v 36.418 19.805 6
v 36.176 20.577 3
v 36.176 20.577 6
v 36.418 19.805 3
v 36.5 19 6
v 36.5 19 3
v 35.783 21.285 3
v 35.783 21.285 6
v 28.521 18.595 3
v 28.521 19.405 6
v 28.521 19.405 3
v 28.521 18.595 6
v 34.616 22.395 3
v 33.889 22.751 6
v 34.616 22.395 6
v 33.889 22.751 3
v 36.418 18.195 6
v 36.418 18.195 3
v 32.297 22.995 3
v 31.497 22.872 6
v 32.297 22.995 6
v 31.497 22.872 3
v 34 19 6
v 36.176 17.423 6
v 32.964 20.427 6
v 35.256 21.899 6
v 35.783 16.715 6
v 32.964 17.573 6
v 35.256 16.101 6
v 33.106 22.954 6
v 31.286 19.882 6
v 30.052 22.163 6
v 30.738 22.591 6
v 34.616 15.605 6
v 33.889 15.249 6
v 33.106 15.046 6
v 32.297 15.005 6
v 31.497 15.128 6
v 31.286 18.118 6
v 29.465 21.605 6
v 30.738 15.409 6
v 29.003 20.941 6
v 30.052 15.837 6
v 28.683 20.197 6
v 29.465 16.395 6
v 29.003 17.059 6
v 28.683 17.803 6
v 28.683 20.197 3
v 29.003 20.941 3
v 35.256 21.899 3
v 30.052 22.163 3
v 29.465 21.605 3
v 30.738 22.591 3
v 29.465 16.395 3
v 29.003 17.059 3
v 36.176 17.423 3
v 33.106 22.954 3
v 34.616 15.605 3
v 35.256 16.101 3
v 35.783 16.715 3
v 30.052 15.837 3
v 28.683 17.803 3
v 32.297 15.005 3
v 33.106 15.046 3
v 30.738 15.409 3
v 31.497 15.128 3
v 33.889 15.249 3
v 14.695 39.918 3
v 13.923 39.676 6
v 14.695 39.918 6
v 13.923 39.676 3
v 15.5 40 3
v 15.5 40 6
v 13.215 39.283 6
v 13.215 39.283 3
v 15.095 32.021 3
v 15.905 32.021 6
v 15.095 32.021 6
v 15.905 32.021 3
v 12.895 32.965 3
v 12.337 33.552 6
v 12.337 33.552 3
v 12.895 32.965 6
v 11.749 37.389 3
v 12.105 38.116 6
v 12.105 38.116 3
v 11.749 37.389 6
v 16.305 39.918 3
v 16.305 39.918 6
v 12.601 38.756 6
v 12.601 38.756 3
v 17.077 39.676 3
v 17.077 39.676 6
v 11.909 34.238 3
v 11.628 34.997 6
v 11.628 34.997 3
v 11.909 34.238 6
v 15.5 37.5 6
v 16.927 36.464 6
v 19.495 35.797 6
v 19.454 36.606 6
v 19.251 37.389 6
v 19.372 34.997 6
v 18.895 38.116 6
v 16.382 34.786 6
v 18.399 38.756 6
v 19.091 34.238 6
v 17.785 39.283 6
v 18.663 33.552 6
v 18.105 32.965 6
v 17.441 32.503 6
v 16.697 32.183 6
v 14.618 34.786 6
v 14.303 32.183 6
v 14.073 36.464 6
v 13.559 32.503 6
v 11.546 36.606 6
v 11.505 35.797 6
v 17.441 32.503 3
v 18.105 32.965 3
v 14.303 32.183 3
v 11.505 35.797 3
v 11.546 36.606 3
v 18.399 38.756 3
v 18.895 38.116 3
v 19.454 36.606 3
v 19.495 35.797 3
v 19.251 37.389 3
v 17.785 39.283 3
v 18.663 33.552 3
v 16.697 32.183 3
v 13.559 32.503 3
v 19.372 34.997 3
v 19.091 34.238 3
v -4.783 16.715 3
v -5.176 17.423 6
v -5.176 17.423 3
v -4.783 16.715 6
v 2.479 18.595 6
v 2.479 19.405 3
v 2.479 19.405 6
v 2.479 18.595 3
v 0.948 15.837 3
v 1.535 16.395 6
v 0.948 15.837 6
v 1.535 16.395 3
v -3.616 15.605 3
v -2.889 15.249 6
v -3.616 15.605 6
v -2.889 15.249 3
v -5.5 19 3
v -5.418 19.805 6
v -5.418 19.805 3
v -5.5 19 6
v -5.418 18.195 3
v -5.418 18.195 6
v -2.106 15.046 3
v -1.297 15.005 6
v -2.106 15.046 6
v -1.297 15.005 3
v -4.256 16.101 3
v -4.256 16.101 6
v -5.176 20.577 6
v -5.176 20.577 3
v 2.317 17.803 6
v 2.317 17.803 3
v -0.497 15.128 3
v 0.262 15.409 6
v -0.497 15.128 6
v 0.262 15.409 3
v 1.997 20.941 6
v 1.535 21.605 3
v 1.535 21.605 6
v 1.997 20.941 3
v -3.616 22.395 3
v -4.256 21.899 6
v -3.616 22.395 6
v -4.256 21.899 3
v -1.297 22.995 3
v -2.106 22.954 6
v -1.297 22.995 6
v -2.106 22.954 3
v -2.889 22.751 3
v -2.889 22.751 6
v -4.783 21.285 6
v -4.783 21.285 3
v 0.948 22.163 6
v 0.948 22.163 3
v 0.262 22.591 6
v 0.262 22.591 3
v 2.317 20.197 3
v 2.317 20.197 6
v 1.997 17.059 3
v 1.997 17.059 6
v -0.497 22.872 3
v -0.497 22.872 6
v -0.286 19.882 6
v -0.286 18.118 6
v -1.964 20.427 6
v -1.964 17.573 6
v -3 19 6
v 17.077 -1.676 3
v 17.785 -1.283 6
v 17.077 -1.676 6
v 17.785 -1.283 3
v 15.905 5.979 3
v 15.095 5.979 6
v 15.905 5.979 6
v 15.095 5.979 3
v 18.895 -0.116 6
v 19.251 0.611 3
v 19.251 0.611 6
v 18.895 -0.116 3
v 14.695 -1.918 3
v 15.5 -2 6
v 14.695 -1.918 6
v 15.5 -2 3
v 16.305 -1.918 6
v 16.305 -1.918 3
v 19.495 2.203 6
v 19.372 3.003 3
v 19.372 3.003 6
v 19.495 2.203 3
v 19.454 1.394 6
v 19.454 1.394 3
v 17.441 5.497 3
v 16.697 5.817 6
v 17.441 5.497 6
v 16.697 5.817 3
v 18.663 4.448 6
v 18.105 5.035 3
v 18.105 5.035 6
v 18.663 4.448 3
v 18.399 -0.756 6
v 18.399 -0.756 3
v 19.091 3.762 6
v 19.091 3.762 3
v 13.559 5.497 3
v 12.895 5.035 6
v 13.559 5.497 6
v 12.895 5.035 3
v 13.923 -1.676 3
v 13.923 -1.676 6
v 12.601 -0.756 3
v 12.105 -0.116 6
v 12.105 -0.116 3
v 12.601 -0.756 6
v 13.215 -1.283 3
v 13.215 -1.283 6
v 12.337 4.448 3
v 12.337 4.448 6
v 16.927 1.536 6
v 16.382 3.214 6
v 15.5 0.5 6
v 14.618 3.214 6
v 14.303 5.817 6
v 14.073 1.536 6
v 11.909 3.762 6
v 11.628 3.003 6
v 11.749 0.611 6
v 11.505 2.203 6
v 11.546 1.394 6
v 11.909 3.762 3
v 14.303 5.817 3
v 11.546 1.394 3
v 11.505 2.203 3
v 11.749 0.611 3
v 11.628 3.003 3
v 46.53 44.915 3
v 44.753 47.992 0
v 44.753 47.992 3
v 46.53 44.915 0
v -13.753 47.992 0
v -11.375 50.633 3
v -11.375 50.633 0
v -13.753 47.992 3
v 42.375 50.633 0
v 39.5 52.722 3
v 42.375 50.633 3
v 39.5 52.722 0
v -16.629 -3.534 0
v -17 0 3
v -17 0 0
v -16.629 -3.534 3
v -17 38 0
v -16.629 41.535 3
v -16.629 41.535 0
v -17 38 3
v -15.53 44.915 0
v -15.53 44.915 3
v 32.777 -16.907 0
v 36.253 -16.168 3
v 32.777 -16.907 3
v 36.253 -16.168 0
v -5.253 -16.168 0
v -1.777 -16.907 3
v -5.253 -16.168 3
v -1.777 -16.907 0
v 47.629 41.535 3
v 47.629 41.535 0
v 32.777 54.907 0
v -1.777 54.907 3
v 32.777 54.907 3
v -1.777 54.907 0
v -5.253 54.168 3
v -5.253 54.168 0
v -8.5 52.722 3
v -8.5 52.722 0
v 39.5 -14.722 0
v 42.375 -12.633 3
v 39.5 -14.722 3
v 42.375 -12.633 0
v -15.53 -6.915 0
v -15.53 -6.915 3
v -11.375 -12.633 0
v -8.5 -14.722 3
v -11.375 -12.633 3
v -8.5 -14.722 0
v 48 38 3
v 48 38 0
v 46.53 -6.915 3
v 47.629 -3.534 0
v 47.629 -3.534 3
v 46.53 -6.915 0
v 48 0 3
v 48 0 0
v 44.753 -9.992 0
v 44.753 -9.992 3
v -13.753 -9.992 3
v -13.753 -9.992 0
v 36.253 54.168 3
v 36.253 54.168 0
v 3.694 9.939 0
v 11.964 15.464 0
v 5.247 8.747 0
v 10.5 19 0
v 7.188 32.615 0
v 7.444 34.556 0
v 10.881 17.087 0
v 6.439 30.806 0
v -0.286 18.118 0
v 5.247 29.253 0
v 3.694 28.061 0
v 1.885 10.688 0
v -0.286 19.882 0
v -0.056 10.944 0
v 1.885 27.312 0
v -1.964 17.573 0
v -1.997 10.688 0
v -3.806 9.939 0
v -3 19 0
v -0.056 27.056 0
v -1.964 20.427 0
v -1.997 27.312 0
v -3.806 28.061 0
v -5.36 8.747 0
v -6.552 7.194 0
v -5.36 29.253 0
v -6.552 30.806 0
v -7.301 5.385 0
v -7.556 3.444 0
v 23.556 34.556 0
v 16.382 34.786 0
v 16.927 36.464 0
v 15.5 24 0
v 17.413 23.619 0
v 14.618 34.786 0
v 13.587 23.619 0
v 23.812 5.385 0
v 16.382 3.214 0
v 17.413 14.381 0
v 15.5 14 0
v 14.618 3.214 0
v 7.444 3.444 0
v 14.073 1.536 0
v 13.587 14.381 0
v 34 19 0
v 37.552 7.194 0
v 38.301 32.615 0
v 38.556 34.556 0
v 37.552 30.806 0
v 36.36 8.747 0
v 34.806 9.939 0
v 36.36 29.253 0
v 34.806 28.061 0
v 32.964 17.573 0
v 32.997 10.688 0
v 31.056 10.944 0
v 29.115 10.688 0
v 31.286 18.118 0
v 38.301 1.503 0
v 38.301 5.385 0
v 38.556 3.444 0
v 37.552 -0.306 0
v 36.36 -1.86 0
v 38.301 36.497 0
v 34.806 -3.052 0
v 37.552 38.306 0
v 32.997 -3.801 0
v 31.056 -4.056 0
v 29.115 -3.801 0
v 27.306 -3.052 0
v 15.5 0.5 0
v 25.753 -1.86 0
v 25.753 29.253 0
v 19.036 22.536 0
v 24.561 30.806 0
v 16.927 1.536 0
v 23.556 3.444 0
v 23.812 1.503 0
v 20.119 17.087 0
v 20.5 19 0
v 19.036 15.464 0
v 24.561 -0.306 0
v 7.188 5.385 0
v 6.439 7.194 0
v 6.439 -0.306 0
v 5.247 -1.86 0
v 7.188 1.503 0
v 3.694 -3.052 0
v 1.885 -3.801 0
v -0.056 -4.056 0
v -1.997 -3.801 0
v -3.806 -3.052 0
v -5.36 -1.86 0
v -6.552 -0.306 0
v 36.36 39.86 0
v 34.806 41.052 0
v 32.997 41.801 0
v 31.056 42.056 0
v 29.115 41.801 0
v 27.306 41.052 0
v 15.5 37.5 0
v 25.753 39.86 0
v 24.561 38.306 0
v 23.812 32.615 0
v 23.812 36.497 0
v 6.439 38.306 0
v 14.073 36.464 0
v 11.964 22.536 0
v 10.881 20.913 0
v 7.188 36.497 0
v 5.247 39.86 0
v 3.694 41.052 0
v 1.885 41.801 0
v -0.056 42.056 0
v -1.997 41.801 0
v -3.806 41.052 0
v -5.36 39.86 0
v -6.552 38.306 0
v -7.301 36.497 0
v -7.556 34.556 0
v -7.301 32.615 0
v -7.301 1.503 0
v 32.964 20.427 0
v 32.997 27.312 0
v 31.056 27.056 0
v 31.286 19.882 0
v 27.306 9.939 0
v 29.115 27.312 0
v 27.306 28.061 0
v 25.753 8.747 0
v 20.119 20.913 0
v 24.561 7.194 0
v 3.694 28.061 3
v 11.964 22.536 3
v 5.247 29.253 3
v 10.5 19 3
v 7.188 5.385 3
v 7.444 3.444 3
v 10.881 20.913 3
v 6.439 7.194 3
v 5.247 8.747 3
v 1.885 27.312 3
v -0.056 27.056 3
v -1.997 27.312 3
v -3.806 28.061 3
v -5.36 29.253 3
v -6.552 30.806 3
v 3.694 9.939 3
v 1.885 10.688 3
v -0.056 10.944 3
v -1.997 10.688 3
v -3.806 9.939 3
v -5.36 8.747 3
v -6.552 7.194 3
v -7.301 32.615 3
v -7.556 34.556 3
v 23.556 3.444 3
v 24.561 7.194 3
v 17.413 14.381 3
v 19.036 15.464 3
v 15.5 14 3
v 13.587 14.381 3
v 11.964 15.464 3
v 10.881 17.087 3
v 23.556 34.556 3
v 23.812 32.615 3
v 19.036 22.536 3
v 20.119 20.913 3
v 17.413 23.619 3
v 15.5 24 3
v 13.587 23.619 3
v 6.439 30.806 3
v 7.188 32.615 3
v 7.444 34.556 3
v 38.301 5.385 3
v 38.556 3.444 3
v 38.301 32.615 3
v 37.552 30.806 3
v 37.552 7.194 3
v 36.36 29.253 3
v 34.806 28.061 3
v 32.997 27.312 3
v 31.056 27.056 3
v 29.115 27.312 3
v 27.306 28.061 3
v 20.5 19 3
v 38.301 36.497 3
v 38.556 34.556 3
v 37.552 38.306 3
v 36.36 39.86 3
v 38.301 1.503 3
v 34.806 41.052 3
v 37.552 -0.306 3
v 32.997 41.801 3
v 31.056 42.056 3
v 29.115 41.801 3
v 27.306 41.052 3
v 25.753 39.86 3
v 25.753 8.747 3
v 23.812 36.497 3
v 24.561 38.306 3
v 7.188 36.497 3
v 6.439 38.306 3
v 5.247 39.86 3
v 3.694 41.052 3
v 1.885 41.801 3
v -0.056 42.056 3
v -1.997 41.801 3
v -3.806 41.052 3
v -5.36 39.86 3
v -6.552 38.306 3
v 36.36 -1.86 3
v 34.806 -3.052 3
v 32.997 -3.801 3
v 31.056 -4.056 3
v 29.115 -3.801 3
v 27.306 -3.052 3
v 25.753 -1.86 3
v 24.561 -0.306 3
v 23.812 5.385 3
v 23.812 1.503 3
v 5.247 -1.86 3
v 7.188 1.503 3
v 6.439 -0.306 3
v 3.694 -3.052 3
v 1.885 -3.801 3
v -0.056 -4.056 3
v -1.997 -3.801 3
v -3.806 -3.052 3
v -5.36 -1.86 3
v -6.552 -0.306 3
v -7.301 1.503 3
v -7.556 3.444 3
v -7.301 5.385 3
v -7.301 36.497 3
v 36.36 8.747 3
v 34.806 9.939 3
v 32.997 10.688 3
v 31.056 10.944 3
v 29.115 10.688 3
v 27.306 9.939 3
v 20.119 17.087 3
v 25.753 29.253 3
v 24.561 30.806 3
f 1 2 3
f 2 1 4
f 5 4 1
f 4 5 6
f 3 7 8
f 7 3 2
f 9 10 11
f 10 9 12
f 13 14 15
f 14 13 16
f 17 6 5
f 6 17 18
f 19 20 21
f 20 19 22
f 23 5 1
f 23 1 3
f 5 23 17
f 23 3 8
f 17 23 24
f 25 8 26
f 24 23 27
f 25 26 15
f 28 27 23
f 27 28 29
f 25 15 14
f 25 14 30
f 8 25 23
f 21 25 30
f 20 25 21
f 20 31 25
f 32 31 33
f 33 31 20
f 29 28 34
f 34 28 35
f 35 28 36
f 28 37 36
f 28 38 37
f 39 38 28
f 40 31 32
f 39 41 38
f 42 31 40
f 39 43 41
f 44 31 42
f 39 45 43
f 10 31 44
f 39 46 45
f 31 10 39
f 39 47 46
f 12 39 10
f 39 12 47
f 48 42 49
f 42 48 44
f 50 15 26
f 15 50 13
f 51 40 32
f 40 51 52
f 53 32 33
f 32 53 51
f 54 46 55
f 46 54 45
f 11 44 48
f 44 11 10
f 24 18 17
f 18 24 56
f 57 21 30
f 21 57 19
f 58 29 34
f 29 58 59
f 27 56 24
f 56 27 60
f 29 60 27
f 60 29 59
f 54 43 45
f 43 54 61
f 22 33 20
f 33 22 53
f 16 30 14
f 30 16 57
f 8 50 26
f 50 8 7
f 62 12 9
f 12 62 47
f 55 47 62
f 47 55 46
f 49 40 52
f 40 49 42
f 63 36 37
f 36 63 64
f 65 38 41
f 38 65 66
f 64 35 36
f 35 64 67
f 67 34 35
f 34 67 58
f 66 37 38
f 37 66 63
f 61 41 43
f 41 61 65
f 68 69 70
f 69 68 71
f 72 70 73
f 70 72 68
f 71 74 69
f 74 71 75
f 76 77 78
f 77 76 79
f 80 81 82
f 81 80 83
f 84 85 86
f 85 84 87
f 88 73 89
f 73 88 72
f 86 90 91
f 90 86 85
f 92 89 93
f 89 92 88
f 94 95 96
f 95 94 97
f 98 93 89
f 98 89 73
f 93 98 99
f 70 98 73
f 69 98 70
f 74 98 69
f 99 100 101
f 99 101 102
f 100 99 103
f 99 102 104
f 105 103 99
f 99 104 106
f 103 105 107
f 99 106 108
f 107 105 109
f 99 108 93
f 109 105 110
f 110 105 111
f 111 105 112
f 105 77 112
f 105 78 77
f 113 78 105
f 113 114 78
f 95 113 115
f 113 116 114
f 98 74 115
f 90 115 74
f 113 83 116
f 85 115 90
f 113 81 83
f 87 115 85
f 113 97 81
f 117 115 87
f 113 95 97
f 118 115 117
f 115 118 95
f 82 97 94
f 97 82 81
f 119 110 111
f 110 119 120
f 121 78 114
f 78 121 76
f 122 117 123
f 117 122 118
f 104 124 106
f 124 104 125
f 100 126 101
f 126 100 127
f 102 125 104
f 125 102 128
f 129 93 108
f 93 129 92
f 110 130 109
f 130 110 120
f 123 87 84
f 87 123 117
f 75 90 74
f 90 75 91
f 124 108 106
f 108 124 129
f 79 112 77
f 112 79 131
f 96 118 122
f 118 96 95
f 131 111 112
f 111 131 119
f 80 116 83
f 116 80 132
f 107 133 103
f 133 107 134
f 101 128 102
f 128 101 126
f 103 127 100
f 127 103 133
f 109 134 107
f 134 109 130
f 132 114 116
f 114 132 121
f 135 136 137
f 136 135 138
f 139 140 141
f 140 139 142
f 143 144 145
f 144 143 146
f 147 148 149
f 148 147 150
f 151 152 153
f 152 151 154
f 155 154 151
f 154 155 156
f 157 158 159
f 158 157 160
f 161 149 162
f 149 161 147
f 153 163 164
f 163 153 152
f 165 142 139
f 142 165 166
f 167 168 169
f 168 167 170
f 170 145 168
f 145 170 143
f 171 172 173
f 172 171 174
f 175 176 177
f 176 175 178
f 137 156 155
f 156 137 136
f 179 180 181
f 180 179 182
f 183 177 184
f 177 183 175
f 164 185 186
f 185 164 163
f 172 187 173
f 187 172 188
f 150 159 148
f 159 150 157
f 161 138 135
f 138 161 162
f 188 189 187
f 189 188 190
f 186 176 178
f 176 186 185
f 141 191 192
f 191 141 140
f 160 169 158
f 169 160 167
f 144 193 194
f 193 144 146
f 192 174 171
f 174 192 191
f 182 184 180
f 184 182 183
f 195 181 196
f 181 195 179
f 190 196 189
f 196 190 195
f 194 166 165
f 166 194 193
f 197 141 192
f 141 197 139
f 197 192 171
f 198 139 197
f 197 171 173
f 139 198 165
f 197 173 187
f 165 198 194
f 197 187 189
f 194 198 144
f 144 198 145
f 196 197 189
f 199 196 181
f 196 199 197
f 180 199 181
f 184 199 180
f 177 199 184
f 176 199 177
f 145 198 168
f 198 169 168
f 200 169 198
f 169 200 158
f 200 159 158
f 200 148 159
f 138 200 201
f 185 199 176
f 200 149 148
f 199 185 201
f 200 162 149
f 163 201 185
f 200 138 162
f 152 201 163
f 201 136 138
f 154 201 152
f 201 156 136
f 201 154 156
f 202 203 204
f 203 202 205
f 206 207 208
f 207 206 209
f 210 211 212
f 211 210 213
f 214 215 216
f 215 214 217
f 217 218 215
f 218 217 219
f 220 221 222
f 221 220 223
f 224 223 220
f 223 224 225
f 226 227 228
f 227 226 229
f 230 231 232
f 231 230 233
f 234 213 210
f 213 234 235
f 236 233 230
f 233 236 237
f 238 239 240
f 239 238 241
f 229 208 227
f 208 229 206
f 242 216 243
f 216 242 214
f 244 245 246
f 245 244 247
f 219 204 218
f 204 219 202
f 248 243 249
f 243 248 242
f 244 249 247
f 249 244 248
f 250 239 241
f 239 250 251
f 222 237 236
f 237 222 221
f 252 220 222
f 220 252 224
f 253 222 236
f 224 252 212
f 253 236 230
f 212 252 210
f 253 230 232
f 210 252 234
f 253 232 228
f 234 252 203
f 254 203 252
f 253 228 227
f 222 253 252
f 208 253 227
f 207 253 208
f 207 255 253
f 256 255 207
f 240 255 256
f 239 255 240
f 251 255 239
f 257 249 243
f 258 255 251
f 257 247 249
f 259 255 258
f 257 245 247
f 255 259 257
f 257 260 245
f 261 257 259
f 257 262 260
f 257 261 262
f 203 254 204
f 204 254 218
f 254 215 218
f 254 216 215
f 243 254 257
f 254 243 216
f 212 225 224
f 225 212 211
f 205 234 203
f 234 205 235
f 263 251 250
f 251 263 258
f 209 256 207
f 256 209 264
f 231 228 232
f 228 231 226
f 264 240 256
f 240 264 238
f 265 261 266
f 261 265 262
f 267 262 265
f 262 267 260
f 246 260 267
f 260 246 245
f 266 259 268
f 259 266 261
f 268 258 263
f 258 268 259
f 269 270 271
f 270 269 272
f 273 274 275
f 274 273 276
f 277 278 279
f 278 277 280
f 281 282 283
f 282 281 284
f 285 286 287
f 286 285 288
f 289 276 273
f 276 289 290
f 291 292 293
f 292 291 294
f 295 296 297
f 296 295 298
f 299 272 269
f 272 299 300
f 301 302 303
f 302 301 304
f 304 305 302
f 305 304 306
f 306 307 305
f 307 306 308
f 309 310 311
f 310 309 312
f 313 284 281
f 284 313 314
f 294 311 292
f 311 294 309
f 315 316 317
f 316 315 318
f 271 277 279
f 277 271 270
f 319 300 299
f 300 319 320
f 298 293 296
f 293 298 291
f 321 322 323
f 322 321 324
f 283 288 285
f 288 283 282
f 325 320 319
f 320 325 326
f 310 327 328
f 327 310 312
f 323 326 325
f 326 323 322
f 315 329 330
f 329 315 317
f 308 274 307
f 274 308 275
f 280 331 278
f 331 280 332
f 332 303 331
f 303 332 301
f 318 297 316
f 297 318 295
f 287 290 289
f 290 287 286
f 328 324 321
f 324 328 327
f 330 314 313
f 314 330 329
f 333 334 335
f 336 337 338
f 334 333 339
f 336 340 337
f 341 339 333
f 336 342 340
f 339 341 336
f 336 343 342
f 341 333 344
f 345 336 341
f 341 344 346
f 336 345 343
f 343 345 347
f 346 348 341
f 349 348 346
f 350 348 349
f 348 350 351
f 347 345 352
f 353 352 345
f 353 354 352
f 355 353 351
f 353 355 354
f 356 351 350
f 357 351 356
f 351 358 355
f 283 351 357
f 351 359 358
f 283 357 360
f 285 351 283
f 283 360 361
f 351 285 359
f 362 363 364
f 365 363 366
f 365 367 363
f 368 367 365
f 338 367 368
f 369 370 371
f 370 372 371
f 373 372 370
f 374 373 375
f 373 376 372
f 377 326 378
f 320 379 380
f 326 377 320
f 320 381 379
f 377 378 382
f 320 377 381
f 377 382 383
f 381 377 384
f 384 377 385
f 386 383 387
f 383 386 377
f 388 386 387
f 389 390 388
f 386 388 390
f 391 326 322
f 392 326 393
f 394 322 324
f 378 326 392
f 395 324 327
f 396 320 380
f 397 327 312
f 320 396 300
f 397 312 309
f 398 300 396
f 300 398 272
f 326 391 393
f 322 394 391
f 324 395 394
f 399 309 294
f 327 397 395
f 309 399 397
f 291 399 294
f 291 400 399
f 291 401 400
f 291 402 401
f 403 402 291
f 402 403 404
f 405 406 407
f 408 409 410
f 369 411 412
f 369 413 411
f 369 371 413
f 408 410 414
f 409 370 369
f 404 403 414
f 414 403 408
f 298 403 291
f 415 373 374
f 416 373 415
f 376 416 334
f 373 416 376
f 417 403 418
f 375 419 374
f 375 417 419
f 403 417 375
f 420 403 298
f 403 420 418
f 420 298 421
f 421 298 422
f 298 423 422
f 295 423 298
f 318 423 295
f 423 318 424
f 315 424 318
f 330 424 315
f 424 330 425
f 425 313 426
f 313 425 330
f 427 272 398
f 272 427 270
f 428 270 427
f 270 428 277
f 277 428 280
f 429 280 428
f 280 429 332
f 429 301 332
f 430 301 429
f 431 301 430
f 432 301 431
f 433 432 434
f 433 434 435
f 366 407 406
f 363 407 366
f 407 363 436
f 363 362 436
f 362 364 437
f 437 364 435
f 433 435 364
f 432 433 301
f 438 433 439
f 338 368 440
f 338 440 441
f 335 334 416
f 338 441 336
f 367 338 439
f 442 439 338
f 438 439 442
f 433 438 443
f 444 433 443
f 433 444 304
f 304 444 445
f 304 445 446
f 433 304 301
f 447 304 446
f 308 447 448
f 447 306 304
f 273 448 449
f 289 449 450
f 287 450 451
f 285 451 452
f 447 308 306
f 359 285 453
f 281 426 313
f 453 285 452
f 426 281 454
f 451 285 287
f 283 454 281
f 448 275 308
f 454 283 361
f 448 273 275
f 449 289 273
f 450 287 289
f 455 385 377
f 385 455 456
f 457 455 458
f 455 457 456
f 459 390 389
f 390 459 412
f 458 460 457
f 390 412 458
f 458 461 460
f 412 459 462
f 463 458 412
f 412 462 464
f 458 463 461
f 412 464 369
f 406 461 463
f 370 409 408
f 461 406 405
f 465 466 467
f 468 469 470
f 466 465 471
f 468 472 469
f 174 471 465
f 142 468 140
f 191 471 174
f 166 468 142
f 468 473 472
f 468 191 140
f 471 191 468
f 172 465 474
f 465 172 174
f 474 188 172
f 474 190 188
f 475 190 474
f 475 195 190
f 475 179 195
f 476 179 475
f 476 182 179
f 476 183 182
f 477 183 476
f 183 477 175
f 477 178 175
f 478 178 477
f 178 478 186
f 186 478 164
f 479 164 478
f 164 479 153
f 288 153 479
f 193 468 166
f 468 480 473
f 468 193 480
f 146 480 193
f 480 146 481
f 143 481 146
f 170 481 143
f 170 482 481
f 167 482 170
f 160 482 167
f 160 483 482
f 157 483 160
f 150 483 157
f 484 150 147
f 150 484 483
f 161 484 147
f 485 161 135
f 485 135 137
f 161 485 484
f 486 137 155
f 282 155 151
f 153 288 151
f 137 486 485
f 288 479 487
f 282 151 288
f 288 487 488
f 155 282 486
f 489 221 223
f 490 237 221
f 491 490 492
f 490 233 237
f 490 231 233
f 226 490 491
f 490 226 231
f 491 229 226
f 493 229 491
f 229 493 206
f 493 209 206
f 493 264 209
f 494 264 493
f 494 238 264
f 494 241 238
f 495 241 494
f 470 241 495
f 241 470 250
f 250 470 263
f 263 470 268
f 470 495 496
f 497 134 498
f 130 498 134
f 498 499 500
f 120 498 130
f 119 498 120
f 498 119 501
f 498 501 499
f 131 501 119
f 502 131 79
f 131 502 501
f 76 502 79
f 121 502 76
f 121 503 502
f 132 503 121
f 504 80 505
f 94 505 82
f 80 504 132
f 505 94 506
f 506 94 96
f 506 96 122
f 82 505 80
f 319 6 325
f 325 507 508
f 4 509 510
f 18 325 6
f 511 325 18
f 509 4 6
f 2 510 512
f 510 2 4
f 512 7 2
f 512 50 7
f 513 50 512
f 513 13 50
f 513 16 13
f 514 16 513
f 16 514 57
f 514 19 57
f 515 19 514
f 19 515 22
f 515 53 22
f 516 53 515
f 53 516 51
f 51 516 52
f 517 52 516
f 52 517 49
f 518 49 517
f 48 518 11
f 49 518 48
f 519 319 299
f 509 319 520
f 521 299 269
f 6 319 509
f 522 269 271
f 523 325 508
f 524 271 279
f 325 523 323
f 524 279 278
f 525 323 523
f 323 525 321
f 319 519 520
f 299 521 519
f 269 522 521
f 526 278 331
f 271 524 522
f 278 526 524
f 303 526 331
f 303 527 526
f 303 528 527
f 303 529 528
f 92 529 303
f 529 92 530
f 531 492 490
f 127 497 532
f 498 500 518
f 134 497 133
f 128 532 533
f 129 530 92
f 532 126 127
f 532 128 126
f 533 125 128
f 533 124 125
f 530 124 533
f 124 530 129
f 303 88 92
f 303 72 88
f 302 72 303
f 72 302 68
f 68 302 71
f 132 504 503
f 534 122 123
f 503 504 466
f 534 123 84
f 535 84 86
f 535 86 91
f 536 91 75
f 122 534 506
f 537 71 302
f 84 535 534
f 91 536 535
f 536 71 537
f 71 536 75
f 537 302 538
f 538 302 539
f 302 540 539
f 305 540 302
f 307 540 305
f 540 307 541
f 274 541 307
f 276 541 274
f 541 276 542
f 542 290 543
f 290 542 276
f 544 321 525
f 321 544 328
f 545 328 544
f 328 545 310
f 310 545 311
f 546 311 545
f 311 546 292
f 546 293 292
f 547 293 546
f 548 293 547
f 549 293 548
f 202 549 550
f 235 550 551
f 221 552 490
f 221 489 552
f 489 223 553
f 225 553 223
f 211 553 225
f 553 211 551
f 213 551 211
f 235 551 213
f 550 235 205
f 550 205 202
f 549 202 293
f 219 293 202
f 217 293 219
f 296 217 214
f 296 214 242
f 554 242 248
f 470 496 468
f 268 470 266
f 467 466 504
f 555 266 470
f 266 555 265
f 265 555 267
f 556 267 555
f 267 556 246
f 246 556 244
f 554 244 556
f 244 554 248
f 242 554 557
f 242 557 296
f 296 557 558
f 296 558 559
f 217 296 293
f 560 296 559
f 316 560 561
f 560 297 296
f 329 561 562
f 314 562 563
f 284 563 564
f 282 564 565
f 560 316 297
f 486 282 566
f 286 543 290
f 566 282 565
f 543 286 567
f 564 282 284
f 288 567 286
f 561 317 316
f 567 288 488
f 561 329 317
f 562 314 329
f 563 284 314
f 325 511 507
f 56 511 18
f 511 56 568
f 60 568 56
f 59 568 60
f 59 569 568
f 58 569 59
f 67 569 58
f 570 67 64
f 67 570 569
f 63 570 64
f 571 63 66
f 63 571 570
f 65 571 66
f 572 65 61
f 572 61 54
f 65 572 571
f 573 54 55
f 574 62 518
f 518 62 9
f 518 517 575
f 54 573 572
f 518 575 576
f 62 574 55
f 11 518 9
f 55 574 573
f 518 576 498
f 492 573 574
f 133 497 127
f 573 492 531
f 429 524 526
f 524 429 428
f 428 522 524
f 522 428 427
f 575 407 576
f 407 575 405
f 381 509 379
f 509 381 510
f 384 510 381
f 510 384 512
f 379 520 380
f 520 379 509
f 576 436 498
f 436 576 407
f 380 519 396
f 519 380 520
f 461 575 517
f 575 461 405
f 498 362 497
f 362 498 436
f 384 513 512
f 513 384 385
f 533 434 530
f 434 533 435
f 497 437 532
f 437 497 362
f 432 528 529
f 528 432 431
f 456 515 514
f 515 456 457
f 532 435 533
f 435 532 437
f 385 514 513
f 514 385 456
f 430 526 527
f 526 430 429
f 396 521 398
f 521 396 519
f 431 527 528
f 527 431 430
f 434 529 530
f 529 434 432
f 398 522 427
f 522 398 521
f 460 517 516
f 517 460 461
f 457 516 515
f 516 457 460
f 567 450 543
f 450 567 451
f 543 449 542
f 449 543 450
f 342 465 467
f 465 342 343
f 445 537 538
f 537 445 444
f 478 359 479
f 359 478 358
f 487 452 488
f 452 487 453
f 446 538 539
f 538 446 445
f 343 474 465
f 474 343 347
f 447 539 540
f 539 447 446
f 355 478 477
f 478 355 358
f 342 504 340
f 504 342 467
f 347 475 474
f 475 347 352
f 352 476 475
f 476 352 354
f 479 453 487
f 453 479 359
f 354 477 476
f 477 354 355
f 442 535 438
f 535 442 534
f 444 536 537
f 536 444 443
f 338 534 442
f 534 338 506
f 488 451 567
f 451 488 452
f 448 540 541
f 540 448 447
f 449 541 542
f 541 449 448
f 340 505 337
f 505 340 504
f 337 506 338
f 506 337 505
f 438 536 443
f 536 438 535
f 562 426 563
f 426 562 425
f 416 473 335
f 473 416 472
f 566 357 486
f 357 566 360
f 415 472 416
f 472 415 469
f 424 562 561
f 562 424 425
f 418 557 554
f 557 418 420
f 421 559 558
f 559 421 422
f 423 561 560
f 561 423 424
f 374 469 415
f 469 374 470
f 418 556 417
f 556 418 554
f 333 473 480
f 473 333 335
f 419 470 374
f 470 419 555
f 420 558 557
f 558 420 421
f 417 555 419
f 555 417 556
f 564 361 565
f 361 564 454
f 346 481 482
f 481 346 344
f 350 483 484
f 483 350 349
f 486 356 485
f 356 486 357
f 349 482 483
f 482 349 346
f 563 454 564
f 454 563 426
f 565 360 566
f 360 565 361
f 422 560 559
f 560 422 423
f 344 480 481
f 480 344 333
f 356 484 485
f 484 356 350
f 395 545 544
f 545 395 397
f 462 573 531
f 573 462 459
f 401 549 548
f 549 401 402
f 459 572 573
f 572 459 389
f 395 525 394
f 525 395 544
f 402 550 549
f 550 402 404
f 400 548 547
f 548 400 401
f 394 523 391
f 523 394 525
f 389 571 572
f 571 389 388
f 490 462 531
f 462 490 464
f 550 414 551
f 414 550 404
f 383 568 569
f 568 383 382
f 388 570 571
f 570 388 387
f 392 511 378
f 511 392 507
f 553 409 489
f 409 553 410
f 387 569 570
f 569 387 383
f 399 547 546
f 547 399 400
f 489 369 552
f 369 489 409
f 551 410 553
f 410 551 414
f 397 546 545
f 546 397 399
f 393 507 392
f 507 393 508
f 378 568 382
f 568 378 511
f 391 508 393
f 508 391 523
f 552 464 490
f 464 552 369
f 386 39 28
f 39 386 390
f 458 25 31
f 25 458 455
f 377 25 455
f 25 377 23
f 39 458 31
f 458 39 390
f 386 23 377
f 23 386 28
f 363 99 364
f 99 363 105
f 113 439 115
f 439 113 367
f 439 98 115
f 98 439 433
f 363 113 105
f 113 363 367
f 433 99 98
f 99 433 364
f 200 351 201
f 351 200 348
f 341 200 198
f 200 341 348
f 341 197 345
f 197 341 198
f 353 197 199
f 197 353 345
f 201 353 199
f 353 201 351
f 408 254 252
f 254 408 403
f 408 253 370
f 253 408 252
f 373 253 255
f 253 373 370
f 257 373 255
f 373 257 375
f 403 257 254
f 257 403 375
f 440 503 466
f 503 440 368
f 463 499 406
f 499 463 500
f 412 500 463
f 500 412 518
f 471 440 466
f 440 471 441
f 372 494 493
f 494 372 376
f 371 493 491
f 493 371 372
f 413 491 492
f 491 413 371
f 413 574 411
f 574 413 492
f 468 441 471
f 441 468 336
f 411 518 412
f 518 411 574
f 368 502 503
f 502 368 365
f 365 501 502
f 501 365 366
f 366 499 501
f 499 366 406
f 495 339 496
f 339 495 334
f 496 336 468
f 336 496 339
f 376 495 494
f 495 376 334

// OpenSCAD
// file: motor.scad
/*
    Motor mounts for the OpenSCAD aeroplane

    Copyright (C) Tim Molteno, tim@molteno.net

    
    This program is free software: you can redistribute it and/or modify
    it under the terms of the GNU General Public License as published by
    the Free Software Foundation, either version 3 of the License, or
    (at your option) any later version.

    This program is distributed in the hope that it will be useful,
    but WITHOUT ANY WARRANTY; without even the implied warranty of
    MERCHANTABILITY or FITNESS FOR A PARTICULAR PURPOSE.  See the
    GNU General Public License for more details.

    You should have received a copy of the GNU General Public License
    along with this program.  If not, see <http://www.gnu.org/licenses/>.
*/

module motor_mount() {
  difference() {
    union() {
      cylinder(r=6.5, h=10);
      translate([0,0,0.75]) cube([26,7 ,1.5], center=true);
      translate([0,0,0.75]) cube([7, 26,1.5], center=true);
    }
    cylinder(r=4, h=12, center=true);
    for (angle = [0,90,180,270]) {
      rotate(angle) translate([10,0,0]) cylinder(r=1.5, h=5, center=true);
    }
  }
}

/* Turnigy 2730-1500 */
module motor() {
  rotate([0,90,0]) {
    motor_mount();
    color("silver") cylinder(r=1.5, h=42); // shaft
    color("gold") translate([0,0,3]) cylinder(r=4, h=15); // housing
    color("red") translate([0,0,18]) cylinder(r=13.5, h=10); // outrunner
    translate([0,0,28]) cylinder(r=4, h=4.5); // forward housing
  }
}


/* Turnigy nano-tech 300mAH 2S 35-70C */
module battery() {
  cube([46, 18,12.5], center=true);
}


/* Servo. Turnigy TG9e */

module servo() {
  rotate([0,0,90]) {
    translate([-6, -11.5,0]) cube([12, 23, 23]);
    translate([-6,-16.25,16.5]) cube([12, 32.5, 2]);
    translate([0,0,23]) cylinder(r=6, h=4);
    translate([0,0,27]) cylinder(r=2.5, h=2.5);
  }
}

module servo_arm() {
  cylinder(r=3.5, h=4);
  translate([0,0,2.5]) hull() {
    cylinder(r=3.5, h=1.5);
    translate([14,0,0]) cylinder(r=2, h=1.5);
  }
}

motor();
// main file
use <motor.scad>;

width = 72;
radius = 17;
length = 65;

mount_offset = 17;

translateY = width-2*radius;
translateX = length-2*radius;
 module pillar() {
     difference() {
         cylinder(h=4, r=4, $fn=31);
     }
 } 
  module motorMount() {
     for (angle = [0,90,180,270]) {
      rotate(angle) translate([mount_offset,0,0]) pillar();
     }
  }

  module holes() {
     for (angle = [0,90,180,270]) {
      rotate(angle+45) translate([22,0,0]) cylinder(d=15, h = 40, center=true);
     }
     for (angle = [0,90,180,270]) {
      rotate(angle) translate([mount_offset,0,0]) cylinder(r=1.5, h = 20,center=true);
     }
     cylinder(r=5,h=20, center=true);
  }
    
difference() {
    union() {
    hull() {
        cylinder(h=3, r = radius);
        translate([0,translateY,0])cylinder(h=3, r = radius);
        translate([translateX,0,0])cylinder(h=3, r = radius);
        translate([translateX,translateY,0])cylinder(h=3, r = radius);
    }
    translate([translateX/2,translateY/2,2])rotate([0,0,0])motorMount();
    }
    translate([translateX/2,translateY/2])holes();
}
